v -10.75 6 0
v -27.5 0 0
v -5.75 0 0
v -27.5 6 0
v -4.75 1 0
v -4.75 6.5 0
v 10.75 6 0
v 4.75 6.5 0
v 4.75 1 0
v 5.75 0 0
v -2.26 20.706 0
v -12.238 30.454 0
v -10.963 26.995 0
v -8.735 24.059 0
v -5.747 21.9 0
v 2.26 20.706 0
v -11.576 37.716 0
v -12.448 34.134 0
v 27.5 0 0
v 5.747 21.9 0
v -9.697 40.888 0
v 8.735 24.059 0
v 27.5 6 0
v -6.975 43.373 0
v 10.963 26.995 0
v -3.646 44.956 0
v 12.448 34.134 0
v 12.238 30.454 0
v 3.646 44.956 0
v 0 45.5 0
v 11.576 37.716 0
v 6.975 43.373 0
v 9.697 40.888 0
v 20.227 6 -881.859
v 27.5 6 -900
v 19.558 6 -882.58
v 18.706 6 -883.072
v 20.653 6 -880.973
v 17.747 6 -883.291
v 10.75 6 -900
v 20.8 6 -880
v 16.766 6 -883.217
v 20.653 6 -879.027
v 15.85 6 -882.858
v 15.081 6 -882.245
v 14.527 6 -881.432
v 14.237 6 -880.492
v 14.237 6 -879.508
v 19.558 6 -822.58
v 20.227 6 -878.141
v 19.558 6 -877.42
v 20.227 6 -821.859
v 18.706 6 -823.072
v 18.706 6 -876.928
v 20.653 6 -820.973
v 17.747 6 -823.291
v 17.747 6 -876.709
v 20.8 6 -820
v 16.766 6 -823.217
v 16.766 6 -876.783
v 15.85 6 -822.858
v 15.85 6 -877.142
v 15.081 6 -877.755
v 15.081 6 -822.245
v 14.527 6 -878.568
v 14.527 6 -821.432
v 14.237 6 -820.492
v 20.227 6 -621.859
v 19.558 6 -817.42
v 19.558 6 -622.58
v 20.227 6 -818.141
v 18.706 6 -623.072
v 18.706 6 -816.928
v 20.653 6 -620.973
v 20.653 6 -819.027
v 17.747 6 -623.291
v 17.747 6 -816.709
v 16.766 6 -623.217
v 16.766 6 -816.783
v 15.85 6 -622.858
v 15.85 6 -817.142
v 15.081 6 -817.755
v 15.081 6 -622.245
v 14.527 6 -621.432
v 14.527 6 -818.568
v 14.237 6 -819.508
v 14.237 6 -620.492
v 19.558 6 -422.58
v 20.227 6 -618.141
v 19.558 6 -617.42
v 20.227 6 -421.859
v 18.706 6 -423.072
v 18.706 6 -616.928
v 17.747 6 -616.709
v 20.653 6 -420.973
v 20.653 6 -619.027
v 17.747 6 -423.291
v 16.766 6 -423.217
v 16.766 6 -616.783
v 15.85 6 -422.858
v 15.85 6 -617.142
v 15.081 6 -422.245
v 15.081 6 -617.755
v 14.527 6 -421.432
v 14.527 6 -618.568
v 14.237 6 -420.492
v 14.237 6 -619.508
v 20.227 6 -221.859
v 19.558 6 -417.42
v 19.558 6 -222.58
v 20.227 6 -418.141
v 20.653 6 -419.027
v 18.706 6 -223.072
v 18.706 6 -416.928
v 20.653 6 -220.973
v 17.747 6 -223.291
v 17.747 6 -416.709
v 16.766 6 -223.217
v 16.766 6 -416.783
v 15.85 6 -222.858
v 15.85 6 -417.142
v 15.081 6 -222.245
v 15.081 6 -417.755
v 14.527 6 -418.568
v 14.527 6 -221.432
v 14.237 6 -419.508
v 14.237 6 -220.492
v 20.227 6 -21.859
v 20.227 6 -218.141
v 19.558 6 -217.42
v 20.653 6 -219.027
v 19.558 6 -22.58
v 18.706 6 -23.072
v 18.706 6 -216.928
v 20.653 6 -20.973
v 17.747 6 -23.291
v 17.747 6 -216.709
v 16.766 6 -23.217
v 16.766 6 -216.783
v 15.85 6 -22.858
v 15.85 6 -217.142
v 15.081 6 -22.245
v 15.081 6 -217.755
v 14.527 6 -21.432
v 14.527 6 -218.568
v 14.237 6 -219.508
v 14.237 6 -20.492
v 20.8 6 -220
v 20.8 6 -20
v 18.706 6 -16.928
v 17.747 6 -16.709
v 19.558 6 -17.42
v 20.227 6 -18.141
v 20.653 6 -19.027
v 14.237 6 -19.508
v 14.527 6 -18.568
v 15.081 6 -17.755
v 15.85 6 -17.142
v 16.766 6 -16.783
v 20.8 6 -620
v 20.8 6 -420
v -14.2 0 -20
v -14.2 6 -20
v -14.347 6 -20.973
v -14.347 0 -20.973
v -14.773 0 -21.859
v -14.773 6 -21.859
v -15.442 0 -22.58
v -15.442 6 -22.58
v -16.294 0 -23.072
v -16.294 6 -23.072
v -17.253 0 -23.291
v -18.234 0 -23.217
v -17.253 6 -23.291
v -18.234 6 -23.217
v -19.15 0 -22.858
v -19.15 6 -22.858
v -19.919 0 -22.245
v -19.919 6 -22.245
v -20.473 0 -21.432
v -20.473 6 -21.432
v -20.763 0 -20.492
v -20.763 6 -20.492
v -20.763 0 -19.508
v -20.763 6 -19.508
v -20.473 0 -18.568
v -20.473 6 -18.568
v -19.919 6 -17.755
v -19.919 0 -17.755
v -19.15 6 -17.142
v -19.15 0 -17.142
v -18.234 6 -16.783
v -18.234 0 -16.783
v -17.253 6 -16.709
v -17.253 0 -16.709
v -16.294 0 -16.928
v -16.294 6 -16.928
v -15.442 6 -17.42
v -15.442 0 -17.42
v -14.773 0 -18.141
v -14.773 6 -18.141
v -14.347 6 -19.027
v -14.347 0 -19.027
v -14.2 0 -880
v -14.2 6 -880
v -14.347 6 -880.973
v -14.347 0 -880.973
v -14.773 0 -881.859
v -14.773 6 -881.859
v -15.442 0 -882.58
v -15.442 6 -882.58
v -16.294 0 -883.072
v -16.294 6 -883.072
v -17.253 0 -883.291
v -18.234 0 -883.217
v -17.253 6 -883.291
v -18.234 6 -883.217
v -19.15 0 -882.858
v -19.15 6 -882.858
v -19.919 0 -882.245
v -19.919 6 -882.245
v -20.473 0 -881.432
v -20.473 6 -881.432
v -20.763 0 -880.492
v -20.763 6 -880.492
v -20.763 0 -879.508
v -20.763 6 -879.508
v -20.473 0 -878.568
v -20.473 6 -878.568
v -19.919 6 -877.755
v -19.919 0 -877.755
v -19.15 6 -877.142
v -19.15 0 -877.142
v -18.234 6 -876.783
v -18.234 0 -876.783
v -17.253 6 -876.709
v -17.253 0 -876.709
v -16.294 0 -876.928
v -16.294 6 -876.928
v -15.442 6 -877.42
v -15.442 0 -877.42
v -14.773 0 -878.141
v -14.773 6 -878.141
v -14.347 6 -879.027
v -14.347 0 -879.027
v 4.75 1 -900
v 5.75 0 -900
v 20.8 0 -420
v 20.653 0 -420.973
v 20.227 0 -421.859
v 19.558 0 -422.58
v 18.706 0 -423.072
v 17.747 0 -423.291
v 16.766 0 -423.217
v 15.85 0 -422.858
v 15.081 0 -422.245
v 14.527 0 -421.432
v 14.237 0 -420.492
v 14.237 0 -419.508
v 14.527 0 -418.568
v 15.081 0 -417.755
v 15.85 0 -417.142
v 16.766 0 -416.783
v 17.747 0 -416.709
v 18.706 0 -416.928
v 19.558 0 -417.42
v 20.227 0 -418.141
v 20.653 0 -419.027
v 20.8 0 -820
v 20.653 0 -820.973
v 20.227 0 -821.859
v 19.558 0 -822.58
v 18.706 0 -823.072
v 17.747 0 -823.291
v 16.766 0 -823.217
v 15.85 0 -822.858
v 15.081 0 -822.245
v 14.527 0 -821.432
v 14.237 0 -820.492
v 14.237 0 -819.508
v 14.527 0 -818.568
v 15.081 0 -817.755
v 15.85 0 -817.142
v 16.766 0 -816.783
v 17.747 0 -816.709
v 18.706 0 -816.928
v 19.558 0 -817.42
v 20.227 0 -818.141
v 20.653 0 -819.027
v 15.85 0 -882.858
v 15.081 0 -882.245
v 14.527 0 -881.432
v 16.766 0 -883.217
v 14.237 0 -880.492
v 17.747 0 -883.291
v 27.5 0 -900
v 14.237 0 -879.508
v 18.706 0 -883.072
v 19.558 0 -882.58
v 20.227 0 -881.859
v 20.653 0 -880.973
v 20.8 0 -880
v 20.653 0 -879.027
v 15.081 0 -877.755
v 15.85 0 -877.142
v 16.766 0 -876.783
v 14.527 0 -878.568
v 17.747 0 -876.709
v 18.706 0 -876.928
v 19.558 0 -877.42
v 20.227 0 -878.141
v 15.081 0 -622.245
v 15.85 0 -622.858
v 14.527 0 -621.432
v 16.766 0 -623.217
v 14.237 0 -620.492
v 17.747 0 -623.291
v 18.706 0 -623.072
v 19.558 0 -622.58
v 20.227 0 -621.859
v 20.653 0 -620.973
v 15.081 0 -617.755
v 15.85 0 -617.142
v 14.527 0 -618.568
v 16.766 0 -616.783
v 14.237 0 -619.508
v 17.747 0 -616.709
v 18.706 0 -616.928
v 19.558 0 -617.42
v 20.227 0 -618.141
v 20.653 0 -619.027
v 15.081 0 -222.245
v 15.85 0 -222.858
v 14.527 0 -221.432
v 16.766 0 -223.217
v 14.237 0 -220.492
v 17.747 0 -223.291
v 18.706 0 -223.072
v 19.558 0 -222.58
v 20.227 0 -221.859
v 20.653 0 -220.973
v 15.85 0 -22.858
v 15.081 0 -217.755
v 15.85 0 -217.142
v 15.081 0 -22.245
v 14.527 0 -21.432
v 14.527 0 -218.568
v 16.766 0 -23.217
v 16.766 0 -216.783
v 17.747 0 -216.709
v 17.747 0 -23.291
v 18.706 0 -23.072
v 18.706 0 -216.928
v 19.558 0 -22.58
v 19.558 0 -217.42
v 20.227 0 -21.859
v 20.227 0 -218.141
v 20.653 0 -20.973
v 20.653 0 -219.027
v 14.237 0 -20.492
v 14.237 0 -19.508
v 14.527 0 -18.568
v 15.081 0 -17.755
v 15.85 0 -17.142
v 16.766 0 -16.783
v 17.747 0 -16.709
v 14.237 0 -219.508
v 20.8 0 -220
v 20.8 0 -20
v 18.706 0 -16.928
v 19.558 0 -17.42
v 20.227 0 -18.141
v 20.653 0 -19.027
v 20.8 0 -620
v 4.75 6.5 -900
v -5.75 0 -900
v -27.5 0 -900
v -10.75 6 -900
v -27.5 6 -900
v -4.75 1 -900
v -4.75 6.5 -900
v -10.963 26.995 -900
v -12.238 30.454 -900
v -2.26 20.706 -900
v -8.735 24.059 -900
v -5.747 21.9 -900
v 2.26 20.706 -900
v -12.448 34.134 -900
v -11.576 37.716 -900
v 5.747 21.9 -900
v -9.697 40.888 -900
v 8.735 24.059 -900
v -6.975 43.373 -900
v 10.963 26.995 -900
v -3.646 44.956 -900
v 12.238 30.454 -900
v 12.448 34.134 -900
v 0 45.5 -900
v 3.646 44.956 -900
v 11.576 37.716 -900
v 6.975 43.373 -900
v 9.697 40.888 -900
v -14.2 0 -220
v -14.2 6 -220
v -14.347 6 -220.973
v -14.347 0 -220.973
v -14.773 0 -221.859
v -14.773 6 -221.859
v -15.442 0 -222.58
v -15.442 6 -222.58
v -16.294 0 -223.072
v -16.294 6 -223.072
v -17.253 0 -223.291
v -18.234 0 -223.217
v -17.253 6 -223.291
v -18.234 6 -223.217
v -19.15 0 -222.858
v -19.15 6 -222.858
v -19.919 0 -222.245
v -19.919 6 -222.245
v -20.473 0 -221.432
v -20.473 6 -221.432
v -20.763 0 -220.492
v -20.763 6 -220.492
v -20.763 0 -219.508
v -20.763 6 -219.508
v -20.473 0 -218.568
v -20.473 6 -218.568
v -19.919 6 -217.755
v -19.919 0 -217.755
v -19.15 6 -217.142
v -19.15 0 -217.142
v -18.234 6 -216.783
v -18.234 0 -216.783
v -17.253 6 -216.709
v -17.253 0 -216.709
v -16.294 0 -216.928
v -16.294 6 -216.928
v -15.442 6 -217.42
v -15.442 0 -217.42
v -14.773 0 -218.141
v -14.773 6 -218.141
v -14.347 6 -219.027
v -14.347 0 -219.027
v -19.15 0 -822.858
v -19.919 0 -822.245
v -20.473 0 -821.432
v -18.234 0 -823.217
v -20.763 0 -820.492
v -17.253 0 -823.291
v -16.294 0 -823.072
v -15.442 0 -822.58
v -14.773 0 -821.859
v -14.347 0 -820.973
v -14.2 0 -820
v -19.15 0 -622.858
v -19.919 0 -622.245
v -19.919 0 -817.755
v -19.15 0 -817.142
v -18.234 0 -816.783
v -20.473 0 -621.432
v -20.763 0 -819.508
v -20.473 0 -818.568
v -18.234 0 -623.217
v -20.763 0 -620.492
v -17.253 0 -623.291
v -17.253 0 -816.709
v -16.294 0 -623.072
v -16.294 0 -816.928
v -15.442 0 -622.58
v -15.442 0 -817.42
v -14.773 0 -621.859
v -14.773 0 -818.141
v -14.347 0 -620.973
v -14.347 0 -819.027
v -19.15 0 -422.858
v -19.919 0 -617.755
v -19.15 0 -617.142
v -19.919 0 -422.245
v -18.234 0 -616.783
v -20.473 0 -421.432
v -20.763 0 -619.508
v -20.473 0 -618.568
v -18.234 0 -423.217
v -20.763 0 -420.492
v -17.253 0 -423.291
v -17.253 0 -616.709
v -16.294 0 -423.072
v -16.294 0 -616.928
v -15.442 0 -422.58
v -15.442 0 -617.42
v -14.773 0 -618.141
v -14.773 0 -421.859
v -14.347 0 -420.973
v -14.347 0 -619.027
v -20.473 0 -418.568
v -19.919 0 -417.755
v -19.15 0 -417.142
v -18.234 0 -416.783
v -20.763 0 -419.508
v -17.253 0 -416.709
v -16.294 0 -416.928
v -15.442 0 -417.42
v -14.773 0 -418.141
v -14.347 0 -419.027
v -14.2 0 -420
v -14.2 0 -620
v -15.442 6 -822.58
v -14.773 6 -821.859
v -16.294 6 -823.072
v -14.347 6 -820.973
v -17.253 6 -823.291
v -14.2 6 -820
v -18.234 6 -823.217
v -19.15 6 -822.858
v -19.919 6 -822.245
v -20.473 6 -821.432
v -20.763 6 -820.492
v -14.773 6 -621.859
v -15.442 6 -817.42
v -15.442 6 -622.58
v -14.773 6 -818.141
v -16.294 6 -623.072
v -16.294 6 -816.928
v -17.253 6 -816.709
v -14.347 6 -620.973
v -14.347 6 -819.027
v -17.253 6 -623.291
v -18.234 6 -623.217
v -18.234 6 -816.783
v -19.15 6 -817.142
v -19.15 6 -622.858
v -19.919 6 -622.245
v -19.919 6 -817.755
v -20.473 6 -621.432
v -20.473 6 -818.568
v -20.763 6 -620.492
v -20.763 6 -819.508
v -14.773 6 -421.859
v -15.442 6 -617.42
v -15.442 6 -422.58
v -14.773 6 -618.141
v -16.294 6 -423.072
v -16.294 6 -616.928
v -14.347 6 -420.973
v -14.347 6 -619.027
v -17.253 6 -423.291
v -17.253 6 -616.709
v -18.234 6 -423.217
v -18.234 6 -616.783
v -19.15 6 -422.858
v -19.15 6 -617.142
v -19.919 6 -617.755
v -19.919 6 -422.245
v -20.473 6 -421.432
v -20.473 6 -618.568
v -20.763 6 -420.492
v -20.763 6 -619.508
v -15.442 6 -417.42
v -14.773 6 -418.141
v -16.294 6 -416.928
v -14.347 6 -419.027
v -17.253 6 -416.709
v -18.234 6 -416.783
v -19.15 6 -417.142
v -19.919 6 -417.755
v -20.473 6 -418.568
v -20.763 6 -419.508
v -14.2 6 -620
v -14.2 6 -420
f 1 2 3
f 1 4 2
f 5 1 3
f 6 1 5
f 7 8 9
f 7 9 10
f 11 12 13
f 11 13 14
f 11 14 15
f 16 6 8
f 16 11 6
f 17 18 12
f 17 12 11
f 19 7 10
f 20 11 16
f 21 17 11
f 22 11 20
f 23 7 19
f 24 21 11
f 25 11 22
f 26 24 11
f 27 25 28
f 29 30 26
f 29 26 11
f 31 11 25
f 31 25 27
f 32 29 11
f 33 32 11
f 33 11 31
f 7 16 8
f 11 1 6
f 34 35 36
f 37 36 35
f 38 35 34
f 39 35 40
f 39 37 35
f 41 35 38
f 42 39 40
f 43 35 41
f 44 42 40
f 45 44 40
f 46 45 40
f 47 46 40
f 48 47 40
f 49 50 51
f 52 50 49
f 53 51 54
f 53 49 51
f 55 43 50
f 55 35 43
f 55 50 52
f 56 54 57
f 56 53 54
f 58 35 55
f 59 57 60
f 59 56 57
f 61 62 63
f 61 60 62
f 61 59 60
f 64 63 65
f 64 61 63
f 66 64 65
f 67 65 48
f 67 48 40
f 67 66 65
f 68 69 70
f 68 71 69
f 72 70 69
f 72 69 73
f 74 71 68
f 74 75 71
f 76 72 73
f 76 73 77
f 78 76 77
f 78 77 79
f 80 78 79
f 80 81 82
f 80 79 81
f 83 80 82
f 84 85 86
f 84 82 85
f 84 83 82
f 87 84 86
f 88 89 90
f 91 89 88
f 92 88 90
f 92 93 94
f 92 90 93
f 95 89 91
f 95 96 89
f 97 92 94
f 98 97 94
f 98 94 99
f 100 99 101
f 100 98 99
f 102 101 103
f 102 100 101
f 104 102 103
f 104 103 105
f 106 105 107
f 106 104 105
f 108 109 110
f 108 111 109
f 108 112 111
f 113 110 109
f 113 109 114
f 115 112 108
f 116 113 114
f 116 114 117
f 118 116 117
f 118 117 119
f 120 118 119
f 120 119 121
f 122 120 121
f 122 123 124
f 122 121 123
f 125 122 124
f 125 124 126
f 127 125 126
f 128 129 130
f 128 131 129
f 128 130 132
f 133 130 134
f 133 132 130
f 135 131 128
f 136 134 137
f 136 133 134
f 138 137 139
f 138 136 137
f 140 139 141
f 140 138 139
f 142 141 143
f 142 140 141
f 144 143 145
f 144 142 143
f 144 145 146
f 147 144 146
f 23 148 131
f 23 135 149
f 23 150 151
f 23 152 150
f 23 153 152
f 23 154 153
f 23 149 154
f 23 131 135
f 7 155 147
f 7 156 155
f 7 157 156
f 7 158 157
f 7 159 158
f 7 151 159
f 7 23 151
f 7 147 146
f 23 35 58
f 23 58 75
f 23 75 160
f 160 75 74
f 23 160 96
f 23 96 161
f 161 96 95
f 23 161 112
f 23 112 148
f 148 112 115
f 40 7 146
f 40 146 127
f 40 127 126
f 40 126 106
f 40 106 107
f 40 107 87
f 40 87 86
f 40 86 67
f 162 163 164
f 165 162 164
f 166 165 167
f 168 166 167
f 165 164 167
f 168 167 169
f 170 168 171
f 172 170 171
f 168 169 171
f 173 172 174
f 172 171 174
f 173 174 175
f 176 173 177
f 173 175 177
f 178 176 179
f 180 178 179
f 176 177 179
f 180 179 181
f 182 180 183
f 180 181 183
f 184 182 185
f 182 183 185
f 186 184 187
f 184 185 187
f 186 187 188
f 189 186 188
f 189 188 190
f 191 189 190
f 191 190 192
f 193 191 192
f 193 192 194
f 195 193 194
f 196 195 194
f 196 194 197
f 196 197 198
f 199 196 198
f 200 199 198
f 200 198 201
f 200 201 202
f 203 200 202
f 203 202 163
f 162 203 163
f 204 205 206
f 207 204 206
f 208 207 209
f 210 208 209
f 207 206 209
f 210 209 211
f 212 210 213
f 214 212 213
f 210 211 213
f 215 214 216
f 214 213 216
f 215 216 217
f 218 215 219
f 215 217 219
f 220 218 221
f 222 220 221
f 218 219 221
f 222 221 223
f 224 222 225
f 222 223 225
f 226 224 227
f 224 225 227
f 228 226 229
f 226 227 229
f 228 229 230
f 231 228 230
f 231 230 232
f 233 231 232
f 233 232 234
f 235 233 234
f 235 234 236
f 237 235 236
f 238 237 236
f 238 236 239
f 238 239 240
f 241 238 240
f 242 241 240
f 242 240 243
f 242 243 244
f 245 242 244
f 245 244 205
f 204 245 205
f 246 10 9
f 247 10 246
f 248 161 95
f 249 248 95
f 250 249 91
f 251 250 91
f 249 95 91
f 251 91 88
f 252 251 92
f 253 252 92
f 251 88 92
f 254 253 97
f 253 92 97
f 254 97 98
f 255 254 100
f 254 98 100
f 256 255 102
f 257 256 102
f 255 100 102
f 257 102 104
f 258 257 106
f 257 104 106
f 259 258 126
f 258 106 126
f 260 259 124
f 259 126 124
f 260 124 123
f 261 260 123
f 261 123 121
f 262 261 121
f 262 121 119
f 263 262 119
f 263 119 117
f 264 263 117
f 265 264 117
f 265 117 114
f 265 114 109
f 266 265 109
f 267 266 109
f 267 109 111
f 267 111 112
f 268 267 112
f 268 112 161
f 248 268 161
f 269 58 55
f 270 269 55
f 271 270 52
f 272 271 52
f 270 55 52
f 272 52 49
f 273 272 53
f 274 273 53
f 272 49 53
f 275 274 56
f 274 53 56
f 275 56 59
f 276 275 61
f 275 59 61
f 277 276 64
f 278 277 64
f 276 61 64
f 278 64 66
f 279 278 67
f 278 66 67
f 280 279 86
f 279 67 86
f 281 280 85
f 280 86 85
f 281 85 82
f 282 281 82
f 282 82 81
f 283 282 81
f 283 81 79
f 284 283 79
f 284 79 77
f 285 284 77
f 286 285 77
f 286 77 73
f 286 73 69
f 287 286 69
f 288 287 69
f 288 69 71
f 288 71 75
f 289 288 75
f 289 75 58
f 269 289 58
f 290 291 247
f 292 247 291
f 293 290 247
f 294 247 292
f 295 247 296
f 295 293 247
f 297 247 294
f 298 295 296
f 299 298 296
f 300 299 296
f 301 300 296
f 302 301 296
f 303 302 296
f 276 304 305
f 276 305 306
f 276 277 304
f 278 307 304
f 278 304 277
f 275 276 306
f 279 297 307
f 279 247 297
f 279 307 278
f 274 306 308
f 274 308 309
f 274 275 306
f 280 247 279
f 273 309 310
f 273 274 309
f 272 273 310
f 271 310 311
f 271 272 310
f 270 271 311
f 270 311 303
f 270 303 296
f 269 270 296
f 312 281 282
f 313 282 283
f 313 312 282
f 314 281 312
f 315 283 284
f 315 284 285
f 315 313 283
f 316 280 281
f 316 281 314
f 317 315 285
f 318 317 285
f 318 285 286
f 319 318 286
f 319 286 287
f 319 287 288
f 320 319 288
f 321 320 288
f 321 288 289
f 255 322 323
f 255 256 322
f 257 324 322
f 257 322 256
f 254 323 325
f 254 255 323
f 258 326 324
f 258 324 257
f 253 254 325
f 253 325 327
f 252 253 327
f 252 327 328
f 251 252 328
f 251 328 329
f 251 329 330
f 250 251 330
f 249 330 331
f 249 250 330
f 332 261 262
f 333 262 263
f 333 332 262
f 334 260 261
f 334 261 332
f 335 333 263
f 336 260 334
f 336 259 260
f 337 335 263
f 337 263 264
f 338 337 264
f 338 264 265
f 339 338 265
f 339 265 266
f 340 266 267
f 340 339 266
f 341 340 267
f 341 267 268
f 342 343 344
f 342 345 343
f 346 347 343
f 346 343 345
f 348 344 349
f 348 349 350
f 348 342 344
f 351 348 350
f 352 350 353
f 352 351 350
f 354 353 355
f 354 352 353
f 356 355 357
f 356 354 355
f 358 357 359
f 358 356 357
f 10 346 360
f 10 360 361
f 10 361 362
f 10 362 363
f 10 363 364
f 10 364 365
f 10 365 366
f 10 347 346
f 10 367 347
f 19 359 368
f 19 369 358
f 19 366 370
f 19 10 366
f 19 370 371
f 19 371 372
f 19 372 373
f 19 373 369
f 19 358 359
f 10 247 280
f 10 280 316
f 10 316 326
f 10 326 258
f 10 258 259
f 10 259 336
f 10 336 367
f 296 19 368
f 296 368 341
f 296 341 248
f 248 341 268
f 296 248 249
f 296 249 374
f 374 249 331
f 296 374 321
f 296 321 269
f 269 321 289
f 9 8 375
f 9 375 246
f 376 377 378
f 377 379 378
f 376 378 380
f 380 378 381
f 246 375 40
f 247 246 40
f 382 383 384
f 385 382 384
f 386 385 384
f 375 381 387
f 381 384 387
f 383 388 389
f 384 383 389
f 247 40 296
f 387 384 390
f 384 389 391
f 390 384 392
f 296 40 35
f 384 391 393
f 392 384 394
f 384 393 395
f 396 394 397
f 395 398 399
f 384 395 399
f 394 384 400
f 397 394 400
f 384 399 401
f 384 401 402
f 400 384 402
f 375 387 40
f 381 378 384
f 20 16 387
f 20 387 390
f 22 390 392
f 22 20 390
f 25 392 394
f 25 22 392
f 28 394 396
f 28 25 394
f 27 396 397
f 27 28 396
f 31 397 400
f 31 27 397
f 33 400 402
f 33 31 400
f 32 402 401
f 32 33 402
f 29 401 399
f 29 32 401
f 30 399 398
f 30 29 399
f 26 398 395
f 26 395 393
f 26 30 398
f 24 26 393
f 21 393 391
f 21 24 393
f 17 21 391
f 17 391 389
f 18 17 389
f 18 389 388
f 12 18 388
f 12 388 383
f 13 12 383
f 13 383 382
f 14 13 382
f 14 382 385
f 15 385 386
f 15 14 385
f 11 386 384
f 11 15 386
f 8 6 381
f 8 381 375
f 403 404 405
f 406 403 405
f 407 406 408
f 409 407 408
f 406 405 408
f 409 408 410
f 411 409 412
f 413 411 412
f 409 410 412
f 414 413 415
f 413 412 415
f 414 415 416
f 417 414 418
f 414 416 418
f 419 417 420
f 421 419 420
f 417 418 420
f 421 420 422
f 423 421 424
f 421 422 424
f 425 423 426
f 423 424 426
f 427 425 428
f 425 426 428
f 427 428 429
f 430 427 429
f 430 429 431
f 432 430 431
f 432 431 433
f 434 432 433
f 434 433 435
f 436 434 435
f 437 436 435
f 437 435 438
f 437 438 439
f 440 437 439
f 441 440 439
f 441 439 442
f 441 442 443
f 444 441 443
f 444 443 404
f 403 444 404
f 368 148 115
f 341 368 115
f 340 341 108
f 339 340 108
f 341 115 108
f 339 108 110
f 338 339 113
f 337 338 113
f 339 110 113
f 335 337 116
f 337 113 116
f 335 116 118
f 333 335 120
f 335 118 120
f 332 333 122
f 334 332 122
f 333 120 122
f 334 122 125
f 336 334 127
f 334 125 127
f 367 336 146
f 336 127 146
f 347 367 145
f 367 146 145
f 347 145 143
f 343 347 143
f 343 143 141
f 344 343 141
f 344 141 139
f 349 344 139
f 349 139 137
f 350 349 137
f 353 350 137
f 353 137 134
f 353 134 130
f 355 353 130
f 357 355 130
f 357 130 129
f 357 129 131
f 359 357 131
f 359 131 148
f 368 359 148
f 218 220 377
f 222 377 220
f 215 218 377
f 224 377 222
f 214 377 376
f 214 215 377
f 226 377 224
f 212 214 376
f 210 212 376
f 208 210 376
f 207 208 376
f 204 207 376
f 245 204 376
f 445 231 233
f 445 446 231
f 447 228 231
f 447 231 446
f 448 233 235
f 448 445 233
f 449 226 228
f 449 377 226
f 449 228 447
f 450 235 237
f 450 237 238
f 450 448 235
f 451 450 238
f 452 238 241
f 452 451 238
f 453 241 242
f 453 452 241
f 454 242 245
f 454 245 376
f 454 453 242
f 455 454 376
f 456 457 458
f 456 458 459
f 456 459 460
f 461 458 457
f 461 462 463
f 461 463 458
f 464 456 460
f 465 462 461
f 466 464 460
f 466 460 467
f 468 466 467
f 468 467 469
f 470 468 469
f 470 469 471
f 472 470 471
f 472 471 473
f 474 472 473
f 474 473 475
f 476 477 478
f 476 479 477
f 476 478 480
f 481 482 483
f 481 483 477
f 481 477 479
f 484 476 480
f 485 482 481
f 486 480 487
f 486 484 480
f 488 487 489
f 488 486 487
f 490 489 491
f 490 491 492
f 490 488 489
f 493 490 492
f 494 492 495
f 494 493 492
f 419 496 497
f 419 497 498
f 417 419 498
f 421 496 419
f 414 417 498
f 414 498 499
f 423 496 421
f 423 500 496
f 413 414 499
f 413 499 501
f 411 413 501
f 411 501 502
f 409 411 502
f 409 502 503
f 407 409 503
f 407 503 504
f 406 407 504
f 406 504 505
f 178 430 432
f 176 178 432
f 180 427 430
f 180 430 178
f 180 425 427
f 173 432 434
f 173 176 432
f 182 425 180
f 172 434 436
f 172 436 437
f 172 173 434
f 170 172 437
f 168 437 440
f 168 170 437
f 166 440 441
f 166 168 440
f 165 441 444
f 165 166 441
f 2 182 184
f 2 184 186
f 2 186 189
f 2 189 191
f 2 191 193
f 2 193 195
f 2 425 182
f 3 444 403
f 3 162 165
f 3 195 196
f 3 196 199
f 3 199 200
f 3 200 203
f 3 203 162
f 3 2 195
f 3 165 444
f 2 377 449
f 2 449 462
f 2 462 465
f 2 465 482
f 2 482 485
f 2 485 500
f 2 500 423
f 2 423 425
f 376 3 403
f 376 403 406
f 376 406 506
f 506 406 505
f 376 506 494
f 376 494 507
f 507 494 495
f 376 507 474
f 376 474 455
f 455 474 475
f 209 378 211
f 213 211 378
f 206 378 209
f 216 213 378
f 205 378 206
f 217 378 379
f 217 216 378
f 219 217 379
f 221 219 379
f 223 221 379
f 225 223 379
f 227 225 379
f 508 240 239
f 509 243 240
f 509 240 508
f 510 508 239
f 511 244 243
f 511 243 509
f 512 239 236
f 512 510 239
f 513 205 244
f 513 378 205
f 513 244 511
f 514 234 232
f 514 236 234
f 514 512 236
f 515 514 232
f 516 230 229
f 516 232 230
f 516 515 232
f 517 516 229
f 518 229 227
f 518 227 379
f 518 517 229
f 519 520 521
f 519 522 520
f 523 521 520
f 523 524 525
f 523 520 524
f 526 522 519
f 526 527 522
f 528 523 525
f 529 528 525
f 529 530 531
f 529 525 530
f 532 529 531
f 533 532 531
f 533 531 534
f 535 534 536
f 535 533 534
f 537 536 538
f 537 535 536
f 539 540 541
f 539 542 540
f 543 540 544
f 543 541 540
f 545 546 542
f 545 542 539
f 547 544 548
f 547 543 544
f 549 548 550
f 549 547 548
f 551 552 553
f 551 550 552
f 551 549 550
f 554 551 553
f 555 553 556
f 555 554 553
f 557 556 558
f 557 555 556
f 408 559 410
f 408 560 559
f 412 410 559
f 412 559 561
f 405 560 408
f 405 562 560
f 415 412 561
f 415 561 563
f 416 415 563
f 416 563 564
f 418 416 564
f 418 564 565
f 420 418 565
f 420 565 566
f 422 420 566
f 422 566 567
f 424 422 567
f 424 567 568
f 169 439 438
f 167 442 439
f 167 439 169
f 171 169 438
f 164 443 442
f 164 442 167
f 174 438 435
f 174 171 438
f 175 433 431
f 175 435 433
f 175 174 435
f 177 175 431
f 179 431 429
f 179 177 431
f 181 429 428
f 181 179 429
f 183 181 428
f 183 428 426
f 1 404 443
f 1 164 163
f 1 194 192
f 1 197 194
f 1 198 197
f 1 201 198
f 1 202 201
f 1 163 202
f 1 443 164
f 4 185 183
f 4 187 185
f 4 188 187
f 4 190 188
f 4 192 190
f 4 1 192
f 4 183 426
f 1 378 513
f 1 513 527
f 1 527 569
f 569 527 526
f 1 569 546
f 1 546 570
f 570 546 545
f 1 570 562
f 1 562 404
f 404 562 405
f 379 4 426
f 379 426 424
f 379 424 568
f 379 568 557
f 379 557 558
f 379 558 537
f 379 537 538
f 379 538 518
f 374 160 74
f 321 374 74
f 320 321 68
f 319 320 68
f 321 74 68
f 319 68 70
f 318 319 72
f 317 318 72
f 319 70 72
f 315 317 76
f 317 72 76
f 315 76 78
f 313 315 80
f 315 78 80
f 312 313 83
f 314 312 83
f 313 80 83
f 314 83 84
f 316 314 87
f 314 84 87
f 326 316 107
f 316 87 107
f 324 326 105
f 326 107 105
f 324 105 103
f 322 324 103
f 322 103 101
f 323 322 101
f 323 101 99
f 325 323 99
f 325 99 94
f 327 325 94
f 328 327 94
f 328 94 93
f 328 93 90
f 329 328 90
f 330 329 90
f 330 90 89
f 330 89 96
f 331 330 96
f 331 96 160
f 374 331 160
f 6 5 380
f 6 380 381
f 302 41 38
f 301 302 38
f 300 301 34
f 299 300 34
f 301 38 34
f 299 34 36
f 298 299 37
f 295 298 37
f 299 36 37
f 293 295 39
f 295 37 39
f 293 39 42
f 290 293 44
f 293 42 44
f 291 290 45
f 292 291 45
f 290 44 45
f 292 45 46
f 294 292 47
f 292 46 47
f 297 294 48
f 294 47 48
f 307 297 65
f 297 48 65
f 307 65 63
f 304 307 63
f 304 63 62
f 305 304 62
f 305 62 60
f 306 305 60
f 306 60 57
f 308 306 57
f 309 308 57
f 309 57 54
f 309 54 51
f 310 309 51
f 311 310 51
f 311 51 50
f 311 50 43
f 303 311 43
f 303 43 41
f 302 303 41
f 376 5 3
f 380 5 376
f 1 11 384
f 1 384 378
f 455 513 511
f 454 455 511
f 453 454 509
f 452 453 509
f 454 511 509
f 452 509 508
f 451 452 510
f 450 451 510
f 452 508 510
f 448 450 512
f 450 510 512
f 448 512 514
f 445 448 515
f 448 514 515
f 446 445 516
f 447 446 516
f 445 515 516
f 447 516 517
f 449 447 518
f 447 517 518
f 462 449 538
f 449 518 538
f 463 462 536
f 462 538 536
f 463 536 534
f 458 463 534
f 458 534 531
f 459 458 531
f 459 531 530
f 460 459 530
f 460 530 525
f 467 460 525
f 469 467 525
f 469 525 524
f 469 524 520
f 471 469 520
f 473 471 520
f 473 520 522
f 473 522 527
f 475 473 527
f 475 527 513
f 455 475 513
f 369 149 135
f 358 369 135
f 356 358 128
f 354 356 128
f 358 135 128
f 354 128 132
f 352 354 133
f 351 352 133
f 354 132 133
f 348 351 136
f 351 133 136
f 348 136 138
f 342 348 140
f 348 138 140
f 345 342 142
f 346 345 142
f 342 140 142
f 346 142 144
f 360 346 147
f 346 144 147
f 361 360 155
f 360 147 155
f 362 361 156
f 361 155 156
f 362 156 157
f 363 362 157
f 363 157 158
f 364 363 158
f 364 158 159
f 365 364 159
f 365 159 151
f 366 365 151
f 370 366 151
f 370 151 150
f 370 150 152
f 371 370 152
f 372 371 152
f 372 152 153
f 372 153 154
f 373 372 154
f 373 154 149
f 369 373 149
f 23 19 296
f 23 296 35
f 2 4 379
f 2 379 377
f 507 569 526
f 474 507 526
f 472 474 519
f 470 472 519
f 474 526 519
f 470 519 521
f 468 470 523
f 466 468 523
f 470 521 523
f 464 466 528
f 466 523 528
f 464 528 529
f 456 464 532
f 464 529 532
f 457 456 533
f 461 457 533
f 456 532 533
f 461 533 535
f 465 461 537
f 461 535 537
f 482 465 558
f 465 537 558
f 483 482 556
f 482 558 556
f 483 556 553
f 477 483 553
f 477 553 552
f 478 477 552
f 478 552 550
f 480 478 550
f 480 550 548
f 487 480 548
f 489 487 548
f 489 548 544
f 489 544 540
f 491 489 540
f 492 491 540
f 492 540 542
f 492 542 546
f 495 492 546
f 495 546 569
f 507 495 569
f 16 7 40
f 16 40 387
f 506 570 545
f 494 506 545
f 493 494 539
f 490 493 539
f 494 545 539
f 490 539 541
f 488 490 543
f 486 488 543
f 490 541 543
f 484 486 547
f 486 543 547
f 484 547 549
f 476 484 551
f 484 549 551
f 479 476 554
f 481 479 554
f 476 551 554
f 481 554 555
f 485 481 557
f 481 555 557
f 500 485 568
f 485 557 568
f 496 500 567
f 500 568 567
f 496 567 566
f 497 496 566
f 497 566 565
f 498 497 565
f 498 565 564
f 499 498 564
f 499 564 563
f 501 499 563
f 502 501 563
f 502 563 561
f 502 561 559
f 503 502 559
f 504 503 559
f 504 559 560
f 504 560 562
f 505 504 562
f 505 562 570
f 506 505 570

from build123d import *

# Parameters (mm, degrees)
SKETCH1_R               = 12.5
BOSS_EXTRUDE1_DEPTH     = 900
CHAMFER1_SIZE           = 1
SKETCH2_R               = 3.3
CUT_EXTRUDE1_DEPTH      = 40.5
CUT_EXTRUDE1_DEPTH_BACK = 7


with BuildPart() as part:
    # Sketch1 → Boss-Extrude1 (new body)
    with BuildSketch(Plane.XY):
        with Locations((0, 33)):
            Circle(SKETCH1_R)
        Polygon((-27.5, 0), (-4.75, 0), (-4.75, 6.5), (4.75, 6.5), (4.75, 0), (27.5, 0), (27.5, 6), (10.75, 6), (2.089745962, 21), (-2.089745962, 21), (-10.75, 6), (-27.5, 6), align=None)
    extrude(amount=-BOSS_EXTRUDE1_DEPTH)

    # Chamfer1
    chamfer1_edges = [part.edges().sort_by_distance(p)[0] for p in [
        (4.75, 0, -450),
        (-4.75, 0, -450),
    ]]
    chamfer(chamfer1_edges, length=CHAMFER1_SIZE)

    # Sketch2 → Cut-Extrude1 (cut, two sides)
    with BuildSketch(Plane(origin=(0, 6, 0), x_dir=(1, 0, 0), z_dir=(0, 1, 0))) as cut_extrude1_sk:
        with Locations((17.5, 20)):
            Circle(SKETCH2_R)
        with Locations((-17.5, 20)):
            Circle(SKETCH2_R)
        with Locations((-17.5, 220)):
            Circle(SKETCH2_R)
        with Locations((17.5, 220)):
            Circle(SKETCH2_R)
        with Locations((-17.5, 420)):
            Circle(SKETCH2_R)
        with Locations((17.5, 420)):
            Circle(SKETCH2_R)
        with Locations((-17.5, 620)):
            Circle(SKETCH2_R)
        with Locations((17.5, 620)):
            Circle(SKETCH2_R)
        with Locations((-17.5, 820)):
            Circle(SKETCH2_R)
        with Locations((17.5, 820)):
            Circle(SKETCH2_R)
        with Locations((-17.5, 1020)):
            Circle(SKETCH2_R)
        with Locations((17.5, 1020)):
            Circle(SKETCH2_R)
        with Locations((-17.5, 1220)):
            Circle(SKETCH2_R)
        with Locations((17.5, 1220)):
            Circle(SKETCH2_R)
        with Locations((-17.5, 1420)):
            Circle(SKETCH2_R)
        with Locations((17.5, 1420)):
            Circle(SKETCH2_R)
        with Locations((-17.5, 1620)):
            Circle(SKETCH2_R)
        with Locations((17.5, 1620)):
            Circle(SKETCH2_R)
        with Locations((17.5, 880)):
            Circle(SKETCH2_R)
        with Locations((-17.5, 880)):
            Circle(SKETCH2_R)
    extrude(amount=CUT_EXTRUDE1_DEPTH, mode=Mode.SUBTRACT)
    extrude(cut_extrude1_sk.sketch, amount=-CUT_EXTRUDE1_DEPTH_BACK, mode=Mode.SUBTRACT)


solid = part.part
